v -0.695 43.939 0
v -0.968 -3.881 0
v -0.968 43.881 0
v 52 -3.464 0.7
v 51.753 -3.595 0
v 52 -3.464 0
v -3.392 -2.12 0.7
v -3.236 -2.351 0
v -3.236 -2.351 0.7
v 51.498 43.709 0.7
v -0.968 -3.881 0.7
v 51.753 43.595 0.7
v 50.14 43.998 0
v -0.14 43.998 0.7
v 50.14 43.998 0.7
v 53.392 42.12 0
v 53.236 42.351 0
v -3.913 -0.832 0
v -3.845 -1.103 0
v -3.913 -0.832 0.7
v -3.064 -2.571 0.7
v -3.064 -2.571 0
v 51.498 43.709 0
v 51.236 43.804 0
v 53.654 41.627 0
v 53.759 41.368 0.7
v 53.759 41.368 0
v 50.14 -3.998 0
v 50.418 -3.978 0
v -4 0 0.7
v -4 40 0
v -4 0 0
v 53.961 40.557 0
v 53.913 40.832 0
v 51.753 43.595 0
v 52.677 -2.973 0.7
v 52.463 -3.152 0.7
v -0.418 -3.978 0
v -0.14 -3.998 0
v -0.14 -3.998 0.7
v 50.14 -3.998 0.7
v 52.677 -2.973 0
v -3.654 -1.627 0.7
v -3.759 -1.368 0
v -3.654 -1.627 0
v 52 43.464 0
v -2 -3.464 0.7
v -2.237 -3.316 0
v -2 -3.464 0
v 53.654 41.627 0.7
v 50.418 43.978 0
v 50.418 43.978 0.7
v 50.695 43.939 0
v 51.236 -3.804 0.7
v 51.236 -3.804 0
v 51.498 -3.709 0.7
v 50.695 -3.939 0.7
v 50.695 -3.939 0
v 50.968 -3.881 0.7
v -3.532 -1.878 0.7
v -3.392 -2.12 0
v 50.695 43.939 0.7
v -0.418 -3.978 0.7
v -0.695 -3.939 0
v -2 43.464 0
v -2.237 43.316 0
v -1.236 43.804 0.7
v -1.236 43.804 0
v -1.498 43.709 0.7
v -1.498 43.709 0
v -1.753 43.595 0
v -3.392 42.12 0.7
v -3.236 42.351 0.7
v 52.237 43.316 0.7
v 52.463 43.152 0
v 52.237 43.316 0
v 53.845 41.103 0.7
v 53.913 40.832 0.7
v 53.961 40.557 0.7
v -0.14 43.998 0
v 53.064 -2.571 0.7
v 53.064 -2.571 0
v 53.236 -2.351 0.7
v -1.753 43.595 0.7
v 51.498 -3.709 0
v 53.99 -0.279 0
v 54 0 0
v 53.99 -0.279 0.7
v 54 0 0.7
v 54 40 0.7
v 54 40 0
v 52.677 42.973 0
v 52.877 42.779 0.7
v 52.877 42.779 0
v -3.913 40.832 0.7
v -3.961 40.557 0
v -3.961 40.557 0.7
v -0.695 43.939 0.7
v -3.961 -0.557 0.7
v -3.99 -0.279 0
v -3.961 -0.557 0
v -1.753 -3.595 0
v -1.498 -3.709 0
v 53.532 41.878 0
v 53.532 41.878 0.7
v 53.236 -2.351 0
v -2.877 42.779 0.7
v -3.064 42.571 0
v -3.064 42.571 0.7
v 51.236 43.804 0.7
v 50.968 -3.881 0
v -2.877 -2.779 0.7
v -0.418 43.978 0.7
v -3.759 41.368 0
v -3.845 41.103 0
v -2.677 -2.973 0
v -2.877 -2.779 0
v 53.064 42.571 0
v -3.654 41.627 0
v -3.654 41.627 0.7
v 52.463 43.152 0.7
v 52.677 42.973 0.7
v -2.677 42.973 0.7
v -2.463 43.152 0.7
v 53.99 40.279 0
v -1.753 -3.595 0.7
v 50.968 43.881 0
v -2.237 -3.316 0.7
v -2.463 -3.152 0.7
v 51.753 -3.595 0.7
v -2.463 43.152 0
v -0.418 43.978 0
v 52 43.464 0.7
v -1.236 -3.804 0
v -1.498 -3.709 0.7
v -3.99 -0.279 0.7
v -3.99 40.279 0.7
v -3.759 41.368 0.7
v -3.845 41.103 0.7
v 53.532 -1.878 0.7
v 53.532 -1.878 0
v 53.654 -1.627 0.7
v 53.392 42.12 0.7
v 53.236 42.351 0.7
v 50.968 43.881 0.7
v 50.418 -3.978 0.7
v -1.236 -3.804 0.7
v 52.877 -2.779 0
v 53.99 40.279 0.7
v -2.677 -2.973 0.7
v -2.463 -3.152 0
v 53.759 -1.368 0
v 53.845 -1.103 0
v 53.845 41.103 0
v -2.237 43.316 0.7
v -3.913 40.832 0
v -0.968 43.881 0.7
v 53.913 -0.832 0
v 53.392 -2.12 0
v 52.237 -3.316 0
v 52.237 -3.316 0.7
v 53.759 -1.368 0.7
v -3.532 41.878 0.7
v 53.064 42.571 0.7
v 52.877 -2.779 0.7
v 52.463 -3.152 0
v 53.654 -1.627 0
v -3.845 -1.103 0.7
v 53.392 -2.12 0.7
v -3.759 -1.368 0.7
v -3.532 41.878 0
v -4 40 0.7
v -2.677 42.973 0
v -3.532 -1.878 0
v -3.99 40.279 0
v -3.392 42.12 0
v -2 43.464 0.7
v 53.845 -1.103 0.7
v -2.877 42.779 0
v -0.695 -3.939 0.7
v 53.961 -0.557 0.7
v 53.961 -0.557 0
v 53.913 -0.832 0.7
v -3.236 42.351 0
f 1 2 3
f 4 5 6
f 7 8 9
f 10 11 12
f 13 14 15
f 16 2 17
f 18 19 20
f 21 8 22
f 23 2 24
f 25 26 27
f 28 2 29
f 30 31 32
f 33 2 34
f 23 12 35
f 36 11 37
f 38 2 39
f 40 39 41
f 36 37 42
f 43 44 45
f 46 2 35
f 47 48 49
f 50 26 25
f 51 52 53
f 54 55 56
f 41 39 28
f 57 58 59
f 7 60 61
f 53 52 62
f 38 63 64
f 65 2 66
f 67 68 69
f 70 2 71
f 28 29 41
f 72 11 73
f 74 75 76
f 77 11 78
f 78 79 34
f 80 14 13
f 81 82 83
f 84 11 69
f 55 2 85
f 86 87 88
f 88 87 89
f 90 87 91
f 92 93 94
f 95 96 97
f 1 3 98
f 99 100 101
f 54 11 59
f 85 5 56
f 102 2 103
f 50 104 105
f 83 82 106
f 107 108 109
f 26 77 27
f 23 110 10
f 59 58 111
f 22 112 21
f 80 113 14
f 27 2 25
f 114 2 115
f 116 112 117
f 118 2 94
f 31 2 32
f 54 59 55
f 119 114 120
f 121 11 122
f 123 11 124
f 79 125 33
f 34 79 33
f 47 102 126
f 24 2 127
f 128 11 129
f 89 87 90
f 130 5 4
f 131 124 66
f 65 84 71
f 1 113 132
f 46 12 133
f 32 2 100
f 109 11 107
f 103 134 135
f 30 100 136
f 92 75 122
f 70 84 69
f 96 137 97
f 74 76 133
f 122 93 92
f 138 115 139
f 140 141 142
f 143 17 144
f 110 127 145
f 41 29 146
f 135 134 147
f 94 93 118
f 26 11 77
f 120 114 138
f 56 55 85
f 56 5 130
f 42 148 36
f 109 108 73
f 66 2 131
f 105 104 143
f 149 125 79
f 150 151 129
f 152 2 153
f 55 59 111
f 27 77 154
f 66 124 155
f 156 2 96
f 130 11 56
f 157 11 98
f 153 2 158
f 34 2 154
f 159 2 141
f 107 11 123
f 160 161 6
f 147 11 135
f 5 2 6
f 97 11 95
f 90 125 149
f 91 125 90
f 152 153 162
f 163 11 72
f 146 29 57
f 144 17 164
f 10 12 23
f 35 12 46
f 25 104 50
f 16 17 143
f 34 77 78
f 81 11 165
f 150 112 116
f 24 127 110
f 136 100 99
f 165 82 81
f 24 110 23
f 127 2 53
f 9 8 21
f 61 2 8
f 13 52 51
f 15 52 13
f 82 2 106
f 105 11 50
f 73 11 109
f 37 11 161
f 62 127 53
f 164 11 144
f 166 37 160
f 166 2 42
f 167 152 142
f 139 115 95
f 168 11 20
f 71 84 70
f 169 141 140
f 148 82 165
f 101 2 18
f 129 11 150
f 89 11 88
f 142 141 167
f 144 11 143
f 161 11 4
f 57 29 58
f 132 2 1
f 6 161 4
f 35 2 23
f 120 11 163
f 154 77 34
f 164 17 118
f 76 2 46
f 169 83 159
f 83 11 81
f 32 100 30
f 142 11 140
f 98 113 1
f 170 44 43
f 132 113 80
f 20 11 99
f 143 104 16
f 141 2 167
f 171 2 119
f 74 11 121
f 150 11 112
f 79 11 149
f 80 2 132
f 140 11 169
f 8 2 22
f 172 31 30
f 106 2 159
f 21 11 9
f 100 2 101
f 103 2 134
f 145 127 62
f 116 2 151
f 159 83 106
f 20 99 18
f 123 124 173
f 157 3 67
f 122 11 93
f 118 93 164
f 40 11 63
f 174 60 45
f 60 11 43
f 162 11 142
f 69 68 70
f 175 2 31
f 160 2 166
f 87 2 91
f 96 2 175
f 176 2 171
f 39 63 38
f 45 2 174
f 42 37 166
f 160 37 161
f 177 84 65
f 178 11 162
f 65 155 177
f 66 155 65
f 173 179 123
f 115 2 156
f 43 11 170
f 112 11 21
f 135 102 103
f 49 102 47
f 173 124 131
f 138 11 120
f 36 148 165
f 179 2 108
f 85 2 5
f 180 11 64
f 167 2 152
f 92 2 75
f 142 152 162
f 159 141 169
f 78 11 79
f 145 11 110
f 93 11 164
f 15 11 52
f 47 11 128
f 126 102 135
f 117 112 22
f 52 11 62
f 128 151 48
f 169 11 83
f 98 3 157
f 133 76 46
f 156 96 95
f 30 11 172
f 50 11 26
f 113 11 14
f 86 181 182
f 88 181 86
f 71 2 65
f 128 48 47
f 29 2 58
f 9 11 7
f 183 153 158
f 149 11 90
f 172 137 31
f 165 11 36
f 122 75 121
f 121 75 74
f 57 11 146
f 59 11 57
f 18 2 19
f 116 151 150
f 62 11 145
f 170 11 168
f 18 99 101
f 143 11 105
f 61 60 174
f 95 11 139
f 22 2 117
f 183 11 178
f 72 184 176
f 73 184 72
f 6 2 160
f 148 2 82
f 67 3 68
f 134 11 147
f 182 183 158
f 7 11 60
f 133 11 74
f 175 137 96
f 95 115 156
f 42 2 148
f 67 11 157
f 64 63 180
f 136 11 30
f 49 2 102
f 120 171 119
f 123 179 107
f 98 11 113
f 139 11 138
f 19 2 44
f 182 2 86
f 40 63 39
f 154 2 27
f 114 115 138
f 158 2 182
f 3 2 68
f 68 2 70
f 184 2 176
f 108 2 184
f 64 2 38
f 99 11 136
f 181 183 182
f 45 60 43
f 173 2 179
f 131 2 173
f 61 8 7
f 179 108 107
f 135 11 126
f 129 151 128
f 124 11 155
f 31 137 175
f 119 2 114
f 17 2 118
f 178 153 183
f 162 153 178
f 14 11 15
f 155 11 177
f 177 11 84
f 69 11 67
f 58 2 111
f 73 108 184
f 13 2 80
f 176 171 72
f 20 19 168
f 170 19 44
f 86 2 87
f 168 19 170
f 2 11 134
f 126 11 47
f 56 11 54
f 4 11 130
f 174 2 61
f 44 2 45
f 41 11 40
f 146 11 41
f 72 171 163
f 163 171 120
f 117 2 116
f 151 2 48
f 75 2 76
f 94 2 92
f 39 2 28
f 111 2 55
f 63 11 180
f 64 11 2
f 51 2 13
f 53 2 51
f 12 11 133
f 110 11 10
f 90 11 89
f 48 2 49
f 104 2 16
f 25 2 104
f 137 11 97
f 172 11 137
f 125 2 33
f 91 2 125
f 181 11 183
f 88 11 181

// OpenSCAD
$fn = 90;
difference() {
minkowski() {
    cube([50, 40, 0.2]);
    cylinder(d = 8, h = 0.5);
}
}
